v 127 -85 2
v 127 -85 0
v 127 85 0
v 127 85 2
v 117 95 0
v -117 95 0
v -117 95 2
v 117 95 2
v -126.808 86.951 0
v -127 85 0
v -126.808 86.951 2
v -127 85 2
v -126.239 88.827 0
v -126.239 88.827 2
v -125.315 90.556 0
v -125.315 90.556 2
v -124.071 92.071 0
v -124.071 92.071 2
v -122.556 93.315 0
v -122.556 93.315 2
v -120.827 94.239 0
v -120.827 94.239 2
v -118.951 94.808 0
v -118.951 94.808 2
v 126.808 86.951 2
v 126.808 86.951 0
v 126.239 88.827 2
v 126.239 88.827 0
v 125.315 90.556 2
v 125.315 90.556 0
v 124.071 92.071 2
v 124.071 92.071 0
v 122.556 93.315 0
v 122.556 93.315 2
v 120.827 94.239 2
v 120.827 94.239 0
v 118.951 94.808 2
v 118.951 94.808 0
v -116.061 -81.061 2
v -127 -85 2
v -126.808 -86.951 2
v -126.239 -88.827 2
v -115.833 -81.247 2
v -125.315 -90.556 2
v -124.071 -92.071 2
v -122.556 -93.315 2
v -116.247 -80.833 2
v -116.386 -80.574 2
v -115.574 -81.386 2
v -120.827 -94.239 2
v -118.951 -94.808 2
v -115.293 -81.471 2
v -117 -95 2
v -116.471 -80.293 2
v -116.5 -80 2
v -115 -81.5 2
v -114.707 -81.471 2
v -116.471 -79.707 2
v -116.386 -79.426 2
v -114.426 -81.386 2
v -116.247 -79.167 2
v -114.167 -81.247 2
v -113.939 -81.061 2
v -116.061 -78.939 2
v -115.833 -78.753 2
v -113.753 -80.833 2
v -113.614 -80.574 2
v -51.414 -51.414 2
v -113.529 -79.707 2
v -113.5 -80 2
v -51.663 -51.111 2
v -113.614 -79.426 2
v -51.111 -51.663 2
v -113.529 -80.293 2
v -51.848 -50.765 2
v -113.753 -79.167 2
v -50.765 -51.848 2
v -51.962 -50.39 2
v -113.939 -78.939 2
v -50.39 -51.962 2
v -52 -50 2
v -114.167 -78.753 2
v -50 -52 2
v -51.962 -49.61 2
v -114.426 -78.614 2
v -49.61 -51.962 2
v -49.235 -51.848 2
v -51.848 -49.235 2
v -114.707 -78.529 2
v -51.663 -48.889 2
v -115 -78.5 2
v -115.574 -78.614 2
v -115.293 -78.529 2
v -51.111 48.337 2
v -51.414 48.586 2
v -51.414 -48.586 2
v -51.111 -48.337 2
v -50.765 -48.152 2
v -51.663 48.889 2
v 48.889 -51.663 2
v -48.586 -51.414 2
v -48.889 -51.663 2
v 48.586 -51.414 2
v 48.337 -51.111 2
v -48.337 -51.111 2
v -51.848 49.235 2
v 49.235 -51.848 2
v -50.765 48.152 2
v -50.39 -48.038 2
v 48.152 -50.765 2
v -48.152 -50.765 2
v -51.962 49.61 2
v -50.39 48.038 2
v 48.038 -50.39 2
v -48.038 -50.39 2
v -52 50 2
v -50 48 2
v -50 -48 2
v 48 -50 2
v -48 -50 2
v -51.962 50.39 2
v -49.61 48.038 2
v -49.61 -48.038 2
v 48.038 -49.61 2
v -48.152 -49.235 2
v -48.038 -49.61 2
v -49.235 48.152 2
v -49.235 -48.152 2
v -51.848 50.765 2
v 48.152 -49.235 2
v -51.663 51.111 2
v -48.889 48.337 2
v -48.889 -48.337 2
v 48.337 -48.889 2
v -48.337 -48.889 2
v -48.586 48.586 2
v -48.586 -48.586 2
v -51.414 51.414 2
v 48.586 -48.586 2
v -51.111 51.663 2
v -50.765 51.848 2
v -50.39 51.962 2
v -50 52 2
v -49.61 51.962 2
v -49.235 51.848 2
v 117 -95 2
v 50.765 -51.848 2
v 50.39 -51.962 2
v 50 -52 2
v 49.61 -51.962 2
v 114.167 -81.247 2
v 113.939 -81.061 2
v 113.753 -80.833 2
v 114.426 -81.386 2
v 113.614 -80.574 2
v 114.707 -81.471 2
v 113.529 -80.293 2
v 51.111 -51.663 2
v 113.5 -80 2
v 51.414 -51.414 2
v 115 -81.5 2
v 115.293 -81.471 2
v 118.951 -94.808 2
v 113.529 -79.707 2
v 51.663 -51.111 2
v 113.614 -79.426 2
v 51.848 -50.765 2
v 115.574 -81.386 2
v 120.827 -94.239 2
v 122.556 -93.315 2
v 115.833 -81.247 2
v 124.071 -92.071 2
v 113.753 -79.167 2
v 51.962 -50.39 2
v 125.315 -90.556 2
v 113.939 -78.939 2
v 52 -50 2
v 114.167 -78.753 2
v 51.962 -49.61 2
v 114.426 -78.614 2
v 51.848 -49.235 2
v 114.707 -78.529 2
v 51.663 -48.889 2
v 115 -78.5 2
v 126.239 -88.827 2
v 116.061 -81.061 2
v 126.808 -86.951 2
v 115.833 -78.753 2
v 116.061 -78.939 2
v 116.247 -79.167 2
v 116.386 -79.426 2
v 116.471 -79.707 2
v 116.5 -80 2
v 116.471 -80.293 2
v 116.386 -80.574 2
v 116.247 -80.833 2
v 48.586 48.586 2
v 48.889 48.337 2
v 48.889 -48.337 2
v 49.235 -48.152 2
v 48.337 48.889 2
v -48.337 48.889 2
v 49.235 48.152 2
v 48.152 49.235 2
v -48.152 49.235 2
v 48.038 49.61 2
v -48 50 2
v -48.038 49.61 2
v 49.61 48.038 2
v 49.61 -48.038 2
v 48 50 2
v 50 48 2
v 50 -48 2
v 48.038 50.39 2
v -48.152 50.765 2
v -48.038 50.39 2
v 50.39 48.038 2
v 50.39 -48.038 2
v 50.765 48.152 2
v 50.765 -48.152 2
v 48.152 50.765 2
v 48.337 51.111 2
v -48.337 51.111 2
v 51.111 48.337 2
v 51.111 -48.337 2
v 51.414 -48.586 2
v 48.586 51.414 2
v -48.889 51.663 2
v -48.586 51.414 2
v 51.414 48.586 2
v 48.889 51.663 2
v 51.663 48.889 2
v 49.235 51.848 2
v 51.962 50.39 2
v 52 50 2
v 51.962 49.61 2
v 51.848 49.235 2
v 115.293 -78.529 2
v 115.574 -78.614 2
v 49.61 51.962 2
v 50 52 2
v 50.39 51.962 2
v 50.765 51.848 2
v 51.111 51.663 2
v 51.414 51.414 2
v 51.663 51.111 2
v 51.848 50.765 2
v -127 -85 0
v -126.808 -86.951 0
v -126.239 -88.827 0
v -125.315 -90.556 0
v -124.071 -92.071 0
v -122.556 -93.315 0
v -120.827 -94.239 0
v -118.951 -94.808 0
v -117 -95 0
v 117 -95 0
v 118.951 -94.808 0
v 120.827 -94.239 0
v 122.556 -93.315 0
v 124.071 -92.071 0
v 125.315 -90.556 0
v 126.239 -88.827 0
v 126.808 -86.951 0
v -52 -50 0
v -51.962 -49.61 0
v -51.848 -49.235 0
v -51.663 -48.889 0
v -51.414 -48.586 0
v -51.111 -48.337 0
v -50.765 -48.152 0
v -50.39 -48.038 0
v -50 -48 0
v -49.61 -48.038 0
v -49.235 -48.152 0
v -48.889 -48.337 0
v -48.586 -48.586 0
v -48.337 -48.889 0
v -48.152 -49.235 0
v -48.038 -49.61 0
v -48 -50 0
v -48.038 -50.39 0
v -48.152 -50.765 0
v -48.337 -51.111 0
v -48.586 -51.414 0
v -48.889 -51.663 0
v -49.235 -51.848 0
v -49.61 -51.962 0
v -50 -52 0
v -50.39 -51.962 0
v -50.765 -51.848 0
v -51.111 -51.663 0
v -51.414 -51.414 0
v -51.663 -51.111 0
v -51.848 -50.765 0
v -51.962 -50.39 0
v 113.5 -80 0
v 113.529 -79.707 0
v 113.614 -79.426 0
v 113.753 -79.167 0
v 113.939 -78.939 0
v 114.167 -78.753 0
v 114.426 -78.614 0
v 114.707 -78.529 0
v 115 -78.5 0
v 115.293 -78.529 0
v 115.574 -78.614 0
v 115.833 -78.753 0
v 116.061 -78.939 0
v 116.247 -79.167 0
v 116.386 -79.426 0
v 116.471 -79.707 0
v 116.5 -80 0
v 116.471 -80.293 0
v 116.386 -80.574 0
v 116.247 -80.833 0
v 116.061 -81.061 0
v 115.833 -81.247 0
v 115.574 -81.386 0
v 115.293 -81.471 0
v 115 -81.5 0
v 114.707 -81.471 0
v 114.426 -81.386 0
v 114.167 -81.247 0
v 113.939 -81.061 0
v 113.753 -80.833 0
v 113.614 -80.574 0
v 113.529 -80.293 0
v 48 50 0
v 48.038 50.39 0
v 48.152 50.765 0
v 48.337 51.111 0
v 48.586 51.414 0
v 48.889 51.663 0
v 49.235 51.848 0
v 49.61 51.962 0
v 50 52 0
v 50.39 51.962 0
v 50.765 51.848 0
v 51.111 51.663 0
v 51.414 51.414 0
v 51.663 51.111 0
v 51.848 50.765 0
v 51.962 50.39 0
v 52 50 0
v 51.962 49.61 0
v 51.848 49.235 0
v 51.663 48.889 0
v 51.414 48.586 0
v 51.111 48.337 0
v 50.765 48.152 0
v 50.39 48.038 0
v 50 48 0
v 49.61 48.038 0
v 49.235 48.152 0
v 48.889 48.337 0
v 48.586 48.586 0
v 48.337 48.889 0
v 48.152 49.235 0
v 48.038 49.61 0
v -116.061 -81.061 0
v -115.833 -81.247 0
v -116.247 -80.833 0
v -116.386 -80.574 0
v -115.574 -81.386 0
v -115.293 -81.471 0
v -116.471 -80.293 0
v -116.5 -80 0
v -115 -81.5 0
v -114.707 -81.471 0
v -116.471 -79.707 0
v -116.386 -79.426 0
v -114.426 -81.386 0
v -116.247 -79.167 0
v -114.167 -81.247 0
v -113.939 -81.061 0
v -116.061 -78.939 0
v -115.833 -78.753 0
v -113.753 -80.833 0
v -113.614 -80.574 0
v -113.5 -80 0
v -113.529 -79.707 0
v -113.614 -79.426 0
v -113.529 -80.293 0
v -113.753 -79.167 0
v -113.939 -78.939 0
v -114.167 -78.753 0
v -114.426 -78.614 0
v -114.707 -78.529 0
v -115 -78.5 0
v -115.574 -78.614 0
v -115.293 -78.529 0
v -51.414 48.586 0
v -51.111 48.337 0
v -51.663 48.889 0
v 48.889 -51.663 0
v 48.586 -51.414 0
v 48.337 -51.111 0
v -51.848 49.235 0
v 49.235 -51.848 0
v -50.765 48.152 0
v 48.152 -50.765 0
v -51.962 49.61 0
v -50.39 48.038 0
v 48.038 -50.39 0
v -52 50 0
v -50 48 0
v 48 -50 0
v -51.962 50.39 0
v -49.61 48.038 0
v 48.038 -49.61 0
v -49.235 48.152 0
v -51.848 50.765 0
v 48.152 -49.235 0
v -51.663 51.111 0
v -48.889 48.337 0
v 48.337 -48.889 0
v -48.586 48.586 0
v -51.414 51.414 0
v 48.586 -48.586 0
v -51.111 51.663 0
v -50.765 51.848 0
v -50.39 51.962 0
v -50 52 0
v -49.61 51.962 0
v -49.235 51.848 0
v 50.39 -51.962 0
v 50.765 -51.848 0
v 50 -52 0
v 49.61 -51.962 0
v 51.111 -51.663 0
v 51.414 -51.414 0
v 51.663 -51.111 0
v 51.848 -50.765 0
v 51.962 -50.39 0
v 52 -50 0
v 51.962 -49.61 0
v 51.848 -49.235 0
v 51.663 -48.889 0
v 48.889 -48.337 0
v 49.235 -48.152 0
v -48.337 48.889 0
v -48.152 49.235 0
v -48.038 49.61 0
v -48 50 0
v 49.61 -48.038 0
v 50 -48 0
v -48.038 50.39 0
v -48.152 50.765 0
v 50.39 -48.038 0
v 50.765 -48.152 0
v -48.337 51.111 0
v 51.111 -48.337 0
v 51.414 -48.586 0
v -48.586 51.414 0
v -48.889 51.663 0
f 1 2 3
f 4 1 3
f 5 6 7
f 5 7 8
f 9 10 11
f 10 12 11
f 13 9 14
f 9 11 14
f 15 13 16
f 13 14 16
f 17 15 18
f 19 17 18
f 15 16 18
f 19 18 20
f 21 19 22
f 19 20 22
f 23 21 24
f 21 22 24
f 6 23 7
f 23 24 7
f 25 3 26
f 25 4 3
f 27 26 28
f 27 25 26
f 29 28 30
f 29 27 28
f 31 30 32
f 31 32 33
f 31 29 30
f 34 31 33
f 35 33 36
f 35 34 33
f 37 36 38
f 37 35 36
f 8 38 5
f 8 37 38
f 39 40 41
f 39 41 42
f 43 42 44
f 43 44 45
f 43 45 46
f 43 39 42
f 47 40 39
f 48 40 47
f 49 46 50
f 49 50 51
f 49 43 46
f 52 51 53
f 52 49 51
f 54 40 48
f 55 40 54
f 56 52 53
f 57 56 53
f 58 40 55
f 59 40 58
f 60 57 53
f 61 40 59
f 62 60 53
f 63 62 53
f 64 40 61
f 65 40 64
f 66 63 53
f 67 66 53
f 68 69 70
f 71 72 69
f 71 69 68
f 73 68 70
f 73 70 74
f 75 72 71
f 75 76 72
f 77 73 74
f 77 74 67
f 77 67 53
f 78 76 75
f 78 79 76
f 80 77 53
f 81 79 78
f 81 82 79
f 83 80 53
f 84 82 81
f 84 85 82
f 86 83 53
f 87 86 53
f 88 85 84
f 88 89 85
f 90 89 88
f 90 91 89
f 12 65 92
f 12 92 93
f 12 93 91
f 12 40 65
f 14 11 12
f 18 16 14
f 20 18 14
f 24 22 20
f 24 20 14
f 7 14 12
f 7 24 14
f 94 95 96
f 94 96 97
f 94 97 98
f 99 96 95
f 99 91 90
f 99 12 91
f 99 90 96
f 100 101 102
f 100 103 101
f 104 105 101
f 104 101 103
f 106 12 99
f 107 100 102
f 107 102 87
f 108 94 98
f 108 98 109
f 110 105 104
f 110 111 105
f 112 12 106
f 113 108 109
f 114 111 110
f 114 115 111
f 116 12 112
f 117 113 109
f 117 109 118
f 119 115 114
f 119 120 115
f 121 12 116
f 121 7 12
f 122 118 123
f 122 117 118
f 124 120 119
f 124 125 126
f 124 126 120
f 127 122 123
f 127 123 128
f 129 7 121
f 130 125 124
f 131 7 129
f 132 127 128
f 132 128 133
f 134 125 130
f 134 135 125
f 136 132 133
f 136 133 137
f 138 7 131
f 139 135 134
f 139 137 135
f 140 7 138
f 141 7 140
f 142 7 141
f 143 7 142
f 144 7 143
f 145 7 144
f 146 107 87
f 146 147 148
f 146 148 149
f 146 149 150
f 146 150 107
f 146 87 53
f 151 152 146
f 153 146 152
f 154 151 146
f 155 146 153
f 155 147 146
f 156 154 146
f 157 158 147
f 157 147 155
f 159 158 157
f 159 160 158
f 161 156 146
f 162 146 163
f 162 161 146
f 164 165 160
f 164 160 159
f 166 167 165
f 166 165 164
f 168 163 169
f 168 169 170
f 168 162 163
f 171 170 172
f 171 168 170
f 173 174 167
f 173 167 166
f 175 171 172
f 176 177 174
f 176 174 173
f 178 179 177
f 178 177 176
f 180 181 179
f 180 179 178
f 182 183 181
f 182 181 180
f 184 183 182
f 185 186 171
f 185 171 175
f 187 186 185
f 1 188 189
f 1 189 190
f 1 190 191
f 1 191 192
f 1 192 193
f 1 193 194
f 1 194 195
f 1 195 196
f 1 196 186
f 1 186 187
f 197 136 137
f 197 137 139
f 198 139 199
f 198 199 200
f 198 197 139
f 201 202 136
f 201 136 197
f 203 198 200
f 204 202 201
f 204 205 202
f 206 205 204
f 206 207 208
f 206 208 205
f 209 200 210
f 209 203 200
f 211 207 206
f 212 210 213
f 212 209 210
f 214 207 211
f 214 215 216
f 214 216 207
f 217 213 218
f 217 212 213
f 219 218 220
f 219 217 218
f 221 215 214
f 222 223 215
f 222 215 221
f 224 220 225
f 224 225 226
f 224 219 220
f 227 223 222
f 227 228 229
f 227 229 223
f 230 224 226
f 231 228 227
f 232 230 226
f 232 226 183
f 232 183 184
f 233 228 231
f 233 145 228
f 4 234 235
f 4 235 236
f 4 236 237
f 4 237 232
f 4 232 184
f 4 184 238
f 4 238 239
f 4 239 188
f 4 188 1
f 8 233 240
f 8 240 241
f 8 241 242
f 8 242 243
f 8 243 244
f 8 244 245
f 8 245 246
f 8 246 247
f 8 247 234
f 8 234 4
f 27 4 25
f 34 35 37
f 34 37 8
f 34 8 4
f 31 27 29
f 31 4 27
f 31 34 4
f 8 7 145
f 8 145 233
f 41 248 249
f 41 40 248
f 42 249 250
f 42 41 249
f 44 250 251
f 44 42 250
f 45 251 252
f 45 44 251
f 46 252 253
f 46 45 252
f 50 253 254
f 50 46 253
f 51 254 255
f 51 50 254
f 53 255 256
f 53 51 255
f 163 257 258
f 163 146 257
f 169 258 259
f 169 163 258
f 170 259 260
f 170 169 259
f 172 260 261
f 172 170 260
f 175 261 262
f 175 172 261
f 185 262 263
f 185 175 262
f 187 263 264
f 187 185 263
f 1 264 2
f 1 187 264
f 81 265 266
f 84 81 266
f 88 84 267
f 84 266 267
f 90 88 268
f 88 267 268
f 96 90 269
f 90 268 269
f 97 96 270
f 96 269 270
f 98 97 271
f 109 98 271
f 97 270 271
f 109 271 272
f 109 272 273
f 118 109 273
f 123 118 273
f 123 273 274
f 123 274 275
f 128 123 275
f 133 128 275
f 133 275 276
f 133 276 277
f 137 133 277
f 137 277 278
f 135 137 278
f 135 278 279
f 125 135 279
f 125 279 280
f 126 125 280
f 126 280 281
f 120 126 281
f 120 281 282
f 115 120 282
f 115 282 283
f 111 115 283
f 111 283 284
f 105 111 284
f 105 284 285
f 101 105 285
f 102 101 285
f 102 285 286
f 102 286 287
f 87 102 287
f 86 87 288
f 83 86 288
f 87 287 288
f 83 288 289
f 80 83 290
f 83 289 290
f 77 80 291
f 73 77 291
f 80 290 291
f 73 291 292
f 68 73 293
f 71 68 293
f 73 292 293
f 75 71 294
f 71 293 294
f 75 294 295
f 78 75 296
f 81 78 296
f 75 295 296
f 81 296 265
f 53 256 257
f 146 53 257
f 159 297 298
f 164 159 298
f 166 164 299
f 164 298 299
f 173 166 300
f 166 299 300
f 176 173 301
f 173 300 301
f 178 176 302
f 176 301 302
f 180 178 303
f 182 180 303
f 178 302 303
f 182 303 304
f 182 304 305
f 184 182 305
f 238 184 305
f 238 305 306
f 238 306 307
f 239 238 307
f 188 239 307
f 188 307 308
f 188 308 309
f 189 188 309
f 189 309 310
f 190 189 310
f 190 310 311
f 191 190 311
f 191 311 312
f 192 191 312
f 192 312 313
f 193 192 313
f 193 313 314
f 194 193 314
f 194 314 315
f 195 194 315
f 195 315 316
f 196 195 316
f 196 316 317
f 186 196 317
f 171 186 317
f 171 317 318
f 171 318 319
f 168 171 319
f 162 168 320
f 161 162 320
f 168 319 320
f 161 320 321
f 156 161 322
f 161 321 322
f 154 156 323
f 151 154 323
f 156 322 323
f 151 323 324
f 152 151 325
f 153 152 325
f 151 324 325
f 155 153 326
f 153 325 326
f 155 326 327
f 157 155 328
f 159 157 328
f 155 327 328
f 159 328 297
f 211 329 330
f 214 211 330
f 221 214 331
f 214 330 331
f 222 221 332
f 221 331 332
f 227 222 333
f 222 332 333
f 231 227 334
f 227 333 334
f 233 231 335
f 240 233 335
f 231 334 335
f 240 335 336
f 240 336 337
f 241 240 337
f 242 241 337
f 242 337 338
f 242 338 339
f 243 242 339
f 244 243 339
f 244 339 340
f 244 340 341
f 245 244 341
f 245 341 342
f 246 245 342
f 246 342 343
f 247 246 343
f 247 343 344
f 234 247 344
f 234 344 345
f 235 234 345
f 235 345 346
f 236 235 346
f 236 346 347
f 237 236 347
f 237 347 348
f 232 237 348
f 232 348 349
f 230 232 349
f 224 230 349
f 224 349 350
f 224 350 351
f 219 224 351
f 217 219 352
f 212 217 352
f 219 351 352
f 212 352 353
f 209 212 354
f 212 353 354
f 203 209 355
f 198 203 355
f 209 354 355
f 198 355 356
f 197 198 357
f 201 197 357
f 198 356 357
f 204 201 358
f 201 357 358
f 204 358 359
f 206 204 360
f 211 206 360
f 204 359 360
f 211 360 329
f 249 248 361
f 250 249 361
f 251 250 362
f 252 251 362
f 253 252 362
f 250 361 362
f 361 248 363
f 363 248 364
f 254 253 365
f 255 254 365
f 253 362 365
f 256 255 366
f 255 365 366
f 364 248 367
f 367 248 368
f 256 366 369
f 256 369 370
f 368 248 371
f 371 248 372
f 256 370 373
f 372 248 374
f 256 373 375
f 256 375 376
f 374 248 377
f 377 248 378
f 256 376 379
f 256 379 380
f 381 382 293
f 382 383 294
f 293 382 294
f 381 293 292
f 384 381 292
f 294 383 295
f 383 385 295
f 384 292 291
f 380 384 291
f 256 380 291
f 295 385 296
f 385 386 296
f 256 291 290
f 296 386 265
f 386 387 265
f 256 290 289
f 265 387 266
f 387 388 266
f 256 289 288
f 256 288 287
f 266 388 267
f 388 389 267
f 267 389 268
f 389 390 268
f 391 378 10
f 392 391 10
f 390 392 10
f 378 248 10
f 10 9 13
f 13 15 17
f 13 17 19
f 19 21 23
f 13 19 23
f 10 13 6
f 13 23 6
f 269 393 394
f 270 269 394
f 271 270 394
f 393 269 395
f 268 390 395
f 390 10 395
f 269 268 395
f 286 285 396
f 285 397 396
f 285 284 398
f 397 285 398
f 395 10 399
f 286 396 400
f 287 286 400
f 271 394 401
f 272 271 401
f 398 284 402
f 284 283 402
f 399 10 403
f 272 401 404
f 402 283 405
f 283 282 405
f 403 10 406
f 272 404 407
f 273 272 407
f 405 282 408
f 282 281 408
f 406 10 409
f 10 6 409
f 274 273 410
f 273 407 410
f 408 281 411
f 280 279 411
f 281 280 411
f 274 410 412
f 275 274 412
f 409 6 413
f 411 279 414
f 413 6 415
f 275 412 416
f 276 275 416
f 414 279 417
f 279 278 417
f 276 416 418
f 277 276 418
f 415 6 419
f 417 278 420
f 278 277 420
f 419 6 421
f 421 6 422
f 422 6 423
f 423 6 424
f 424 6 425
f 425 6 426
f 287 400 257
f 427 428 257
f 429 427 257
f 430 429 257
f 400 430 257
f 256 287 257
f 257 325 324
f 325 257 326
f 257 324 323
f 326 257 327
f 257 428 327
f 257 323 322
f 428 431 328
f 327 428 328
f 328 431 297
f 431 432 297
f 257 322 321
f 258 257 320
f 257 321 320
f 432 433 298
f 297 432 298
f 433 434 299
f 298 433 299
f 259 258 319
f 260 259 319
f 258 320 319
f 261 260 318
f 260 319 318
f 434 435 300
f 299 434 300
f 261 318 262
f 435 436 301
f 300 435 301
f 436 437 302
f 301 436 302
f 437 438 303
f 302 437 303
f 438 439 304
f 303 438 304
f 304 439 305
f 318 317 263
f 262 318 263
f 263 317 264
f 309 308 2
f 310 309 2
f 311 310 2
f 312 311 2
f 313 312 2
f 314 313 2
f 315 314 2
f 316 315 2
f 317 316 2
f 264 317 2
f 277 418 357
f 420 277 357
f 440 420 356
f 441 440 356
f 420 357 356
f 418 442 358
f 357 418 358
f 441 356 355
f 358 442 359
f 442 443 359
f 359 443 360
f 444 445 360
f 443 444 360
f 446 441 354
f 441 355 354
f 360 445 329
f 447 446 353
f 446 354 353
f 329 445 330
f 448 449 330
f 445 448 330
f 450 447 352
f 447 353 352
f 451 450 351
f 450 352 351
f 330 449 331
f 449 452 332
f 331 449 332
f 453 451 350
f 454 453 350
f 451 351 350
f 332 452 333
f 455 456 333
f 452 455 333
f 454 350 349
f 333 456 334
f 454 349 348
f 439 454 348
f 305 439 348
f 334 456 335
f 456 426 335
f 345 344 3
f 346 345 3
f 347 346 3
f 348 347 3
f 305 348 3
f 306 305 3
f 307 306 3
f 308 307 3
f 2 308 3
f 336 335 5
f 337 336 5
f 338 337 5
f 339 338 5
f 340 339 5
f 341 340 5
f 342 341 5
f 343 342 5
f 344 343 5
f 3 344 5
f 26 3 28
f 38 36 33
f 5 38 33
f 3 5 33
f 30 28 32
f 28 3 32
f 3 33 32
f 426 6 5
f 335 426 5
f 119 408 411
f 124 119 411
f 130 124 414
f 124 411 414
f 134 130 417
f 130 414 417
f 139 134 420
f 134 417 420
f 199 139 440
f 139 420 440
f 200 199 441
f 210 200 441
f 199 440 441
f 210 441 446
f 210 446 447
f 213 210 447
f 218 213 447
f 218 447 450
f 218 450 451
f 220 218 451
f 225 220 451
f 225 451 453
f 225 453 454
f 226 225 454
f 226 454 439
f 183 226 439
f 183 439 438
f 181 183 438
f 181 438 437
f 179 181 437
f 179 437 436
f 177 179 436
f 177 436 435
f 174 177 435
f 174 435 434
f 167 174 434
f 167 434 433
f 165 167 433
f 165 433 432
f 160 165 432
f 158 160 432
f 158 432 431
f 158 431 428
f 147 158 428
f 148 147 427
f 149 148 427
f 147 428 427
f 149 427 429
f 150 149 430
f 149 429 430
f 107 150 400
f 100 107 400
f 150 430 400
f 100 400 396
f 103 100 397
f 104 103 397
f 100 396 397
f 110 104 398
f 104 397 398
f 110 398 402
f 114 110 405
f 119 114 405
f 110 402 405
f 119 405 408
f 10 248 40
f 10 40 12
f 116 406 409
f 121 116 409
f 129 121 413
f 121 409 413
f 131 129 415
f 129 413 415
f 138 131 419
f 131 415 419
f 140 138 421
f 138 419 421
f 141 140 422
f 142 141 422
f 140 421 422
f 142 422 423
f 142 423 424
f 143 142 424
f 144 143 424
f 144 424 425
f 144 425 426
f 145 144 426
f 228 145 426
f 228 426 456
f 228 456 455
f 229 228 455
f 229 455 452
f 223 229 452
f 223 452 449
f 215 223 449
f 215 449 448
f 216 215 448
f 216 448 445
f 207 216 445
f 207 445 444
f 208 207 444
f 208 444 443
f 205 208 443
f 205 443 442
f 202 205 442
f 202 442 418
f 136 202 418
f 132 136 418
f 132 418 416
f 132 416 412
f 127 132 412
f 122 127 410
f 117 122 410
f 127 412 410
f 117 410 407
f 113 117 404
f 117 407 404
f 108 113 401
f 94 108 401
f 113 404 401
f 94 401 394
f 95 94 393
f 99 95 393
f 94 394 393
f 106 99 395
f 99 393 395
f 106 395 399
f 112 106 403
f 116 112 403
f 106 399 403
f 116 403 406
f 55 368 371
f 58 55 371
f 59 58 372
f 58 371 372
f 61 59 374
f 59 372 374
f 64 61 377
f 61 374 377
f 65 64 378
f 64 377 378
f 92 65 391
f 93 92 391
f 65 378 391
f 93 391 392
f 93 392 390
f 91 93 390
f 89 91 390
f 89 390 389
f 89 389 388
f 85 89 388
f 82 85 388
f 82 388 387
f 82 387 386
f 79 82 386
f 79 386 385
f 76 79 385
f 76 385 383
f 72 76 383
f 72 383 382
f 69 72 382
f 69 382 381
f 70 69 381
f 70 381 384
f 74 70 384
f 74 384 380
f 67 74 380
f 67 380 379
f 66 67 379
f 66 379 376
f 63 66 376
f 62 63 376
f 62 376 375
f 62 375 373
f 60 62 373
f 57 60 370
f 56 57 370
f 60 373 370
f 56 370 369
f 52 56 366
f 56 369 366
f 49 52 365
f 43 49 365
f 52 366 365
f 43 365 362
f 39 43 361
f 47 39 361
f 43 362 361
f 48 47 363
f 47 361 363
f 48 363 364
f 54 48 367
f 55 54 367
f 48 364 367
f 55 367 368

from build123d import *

# Parameters (mm, degrees)
F0_W     = 254
F0_H     = 190
F1_DEPTH = 2
F2_R     = 10
F4_D     = 4
F6_D     = 3


with BuildPart() as f1:
    # F0 (on Top) → F1 (new body)
    with BuildSketch(Plane.XY):
        Rectangle(F0_W, F0_H)
    extrude(amount=F1_DEPTH)

    # F2
    f2_edges = [f1.edges().sort_by_distance(p)[0] for p in [
        (-127, -95, 1),
        (127, -95, 1),
        (-127, 95, 1),
        (127, 95, 1),
    ]]
    fillet(f2_edges, radius=F2_R)

    # F4 (through all)
    with Locations(Plane.XY.offset(2)):
        with Locations((-50, 50), (50, 50), (50, -50), (-50, -50)):
            Hole(F4_D / 2)

    # F6 (through all)
    with Locations(Plane.XY.offset(2)):
        with Locations((-115, -80), (115, -80)):
            Hole(F6_D / 2)


solid = f1.part
